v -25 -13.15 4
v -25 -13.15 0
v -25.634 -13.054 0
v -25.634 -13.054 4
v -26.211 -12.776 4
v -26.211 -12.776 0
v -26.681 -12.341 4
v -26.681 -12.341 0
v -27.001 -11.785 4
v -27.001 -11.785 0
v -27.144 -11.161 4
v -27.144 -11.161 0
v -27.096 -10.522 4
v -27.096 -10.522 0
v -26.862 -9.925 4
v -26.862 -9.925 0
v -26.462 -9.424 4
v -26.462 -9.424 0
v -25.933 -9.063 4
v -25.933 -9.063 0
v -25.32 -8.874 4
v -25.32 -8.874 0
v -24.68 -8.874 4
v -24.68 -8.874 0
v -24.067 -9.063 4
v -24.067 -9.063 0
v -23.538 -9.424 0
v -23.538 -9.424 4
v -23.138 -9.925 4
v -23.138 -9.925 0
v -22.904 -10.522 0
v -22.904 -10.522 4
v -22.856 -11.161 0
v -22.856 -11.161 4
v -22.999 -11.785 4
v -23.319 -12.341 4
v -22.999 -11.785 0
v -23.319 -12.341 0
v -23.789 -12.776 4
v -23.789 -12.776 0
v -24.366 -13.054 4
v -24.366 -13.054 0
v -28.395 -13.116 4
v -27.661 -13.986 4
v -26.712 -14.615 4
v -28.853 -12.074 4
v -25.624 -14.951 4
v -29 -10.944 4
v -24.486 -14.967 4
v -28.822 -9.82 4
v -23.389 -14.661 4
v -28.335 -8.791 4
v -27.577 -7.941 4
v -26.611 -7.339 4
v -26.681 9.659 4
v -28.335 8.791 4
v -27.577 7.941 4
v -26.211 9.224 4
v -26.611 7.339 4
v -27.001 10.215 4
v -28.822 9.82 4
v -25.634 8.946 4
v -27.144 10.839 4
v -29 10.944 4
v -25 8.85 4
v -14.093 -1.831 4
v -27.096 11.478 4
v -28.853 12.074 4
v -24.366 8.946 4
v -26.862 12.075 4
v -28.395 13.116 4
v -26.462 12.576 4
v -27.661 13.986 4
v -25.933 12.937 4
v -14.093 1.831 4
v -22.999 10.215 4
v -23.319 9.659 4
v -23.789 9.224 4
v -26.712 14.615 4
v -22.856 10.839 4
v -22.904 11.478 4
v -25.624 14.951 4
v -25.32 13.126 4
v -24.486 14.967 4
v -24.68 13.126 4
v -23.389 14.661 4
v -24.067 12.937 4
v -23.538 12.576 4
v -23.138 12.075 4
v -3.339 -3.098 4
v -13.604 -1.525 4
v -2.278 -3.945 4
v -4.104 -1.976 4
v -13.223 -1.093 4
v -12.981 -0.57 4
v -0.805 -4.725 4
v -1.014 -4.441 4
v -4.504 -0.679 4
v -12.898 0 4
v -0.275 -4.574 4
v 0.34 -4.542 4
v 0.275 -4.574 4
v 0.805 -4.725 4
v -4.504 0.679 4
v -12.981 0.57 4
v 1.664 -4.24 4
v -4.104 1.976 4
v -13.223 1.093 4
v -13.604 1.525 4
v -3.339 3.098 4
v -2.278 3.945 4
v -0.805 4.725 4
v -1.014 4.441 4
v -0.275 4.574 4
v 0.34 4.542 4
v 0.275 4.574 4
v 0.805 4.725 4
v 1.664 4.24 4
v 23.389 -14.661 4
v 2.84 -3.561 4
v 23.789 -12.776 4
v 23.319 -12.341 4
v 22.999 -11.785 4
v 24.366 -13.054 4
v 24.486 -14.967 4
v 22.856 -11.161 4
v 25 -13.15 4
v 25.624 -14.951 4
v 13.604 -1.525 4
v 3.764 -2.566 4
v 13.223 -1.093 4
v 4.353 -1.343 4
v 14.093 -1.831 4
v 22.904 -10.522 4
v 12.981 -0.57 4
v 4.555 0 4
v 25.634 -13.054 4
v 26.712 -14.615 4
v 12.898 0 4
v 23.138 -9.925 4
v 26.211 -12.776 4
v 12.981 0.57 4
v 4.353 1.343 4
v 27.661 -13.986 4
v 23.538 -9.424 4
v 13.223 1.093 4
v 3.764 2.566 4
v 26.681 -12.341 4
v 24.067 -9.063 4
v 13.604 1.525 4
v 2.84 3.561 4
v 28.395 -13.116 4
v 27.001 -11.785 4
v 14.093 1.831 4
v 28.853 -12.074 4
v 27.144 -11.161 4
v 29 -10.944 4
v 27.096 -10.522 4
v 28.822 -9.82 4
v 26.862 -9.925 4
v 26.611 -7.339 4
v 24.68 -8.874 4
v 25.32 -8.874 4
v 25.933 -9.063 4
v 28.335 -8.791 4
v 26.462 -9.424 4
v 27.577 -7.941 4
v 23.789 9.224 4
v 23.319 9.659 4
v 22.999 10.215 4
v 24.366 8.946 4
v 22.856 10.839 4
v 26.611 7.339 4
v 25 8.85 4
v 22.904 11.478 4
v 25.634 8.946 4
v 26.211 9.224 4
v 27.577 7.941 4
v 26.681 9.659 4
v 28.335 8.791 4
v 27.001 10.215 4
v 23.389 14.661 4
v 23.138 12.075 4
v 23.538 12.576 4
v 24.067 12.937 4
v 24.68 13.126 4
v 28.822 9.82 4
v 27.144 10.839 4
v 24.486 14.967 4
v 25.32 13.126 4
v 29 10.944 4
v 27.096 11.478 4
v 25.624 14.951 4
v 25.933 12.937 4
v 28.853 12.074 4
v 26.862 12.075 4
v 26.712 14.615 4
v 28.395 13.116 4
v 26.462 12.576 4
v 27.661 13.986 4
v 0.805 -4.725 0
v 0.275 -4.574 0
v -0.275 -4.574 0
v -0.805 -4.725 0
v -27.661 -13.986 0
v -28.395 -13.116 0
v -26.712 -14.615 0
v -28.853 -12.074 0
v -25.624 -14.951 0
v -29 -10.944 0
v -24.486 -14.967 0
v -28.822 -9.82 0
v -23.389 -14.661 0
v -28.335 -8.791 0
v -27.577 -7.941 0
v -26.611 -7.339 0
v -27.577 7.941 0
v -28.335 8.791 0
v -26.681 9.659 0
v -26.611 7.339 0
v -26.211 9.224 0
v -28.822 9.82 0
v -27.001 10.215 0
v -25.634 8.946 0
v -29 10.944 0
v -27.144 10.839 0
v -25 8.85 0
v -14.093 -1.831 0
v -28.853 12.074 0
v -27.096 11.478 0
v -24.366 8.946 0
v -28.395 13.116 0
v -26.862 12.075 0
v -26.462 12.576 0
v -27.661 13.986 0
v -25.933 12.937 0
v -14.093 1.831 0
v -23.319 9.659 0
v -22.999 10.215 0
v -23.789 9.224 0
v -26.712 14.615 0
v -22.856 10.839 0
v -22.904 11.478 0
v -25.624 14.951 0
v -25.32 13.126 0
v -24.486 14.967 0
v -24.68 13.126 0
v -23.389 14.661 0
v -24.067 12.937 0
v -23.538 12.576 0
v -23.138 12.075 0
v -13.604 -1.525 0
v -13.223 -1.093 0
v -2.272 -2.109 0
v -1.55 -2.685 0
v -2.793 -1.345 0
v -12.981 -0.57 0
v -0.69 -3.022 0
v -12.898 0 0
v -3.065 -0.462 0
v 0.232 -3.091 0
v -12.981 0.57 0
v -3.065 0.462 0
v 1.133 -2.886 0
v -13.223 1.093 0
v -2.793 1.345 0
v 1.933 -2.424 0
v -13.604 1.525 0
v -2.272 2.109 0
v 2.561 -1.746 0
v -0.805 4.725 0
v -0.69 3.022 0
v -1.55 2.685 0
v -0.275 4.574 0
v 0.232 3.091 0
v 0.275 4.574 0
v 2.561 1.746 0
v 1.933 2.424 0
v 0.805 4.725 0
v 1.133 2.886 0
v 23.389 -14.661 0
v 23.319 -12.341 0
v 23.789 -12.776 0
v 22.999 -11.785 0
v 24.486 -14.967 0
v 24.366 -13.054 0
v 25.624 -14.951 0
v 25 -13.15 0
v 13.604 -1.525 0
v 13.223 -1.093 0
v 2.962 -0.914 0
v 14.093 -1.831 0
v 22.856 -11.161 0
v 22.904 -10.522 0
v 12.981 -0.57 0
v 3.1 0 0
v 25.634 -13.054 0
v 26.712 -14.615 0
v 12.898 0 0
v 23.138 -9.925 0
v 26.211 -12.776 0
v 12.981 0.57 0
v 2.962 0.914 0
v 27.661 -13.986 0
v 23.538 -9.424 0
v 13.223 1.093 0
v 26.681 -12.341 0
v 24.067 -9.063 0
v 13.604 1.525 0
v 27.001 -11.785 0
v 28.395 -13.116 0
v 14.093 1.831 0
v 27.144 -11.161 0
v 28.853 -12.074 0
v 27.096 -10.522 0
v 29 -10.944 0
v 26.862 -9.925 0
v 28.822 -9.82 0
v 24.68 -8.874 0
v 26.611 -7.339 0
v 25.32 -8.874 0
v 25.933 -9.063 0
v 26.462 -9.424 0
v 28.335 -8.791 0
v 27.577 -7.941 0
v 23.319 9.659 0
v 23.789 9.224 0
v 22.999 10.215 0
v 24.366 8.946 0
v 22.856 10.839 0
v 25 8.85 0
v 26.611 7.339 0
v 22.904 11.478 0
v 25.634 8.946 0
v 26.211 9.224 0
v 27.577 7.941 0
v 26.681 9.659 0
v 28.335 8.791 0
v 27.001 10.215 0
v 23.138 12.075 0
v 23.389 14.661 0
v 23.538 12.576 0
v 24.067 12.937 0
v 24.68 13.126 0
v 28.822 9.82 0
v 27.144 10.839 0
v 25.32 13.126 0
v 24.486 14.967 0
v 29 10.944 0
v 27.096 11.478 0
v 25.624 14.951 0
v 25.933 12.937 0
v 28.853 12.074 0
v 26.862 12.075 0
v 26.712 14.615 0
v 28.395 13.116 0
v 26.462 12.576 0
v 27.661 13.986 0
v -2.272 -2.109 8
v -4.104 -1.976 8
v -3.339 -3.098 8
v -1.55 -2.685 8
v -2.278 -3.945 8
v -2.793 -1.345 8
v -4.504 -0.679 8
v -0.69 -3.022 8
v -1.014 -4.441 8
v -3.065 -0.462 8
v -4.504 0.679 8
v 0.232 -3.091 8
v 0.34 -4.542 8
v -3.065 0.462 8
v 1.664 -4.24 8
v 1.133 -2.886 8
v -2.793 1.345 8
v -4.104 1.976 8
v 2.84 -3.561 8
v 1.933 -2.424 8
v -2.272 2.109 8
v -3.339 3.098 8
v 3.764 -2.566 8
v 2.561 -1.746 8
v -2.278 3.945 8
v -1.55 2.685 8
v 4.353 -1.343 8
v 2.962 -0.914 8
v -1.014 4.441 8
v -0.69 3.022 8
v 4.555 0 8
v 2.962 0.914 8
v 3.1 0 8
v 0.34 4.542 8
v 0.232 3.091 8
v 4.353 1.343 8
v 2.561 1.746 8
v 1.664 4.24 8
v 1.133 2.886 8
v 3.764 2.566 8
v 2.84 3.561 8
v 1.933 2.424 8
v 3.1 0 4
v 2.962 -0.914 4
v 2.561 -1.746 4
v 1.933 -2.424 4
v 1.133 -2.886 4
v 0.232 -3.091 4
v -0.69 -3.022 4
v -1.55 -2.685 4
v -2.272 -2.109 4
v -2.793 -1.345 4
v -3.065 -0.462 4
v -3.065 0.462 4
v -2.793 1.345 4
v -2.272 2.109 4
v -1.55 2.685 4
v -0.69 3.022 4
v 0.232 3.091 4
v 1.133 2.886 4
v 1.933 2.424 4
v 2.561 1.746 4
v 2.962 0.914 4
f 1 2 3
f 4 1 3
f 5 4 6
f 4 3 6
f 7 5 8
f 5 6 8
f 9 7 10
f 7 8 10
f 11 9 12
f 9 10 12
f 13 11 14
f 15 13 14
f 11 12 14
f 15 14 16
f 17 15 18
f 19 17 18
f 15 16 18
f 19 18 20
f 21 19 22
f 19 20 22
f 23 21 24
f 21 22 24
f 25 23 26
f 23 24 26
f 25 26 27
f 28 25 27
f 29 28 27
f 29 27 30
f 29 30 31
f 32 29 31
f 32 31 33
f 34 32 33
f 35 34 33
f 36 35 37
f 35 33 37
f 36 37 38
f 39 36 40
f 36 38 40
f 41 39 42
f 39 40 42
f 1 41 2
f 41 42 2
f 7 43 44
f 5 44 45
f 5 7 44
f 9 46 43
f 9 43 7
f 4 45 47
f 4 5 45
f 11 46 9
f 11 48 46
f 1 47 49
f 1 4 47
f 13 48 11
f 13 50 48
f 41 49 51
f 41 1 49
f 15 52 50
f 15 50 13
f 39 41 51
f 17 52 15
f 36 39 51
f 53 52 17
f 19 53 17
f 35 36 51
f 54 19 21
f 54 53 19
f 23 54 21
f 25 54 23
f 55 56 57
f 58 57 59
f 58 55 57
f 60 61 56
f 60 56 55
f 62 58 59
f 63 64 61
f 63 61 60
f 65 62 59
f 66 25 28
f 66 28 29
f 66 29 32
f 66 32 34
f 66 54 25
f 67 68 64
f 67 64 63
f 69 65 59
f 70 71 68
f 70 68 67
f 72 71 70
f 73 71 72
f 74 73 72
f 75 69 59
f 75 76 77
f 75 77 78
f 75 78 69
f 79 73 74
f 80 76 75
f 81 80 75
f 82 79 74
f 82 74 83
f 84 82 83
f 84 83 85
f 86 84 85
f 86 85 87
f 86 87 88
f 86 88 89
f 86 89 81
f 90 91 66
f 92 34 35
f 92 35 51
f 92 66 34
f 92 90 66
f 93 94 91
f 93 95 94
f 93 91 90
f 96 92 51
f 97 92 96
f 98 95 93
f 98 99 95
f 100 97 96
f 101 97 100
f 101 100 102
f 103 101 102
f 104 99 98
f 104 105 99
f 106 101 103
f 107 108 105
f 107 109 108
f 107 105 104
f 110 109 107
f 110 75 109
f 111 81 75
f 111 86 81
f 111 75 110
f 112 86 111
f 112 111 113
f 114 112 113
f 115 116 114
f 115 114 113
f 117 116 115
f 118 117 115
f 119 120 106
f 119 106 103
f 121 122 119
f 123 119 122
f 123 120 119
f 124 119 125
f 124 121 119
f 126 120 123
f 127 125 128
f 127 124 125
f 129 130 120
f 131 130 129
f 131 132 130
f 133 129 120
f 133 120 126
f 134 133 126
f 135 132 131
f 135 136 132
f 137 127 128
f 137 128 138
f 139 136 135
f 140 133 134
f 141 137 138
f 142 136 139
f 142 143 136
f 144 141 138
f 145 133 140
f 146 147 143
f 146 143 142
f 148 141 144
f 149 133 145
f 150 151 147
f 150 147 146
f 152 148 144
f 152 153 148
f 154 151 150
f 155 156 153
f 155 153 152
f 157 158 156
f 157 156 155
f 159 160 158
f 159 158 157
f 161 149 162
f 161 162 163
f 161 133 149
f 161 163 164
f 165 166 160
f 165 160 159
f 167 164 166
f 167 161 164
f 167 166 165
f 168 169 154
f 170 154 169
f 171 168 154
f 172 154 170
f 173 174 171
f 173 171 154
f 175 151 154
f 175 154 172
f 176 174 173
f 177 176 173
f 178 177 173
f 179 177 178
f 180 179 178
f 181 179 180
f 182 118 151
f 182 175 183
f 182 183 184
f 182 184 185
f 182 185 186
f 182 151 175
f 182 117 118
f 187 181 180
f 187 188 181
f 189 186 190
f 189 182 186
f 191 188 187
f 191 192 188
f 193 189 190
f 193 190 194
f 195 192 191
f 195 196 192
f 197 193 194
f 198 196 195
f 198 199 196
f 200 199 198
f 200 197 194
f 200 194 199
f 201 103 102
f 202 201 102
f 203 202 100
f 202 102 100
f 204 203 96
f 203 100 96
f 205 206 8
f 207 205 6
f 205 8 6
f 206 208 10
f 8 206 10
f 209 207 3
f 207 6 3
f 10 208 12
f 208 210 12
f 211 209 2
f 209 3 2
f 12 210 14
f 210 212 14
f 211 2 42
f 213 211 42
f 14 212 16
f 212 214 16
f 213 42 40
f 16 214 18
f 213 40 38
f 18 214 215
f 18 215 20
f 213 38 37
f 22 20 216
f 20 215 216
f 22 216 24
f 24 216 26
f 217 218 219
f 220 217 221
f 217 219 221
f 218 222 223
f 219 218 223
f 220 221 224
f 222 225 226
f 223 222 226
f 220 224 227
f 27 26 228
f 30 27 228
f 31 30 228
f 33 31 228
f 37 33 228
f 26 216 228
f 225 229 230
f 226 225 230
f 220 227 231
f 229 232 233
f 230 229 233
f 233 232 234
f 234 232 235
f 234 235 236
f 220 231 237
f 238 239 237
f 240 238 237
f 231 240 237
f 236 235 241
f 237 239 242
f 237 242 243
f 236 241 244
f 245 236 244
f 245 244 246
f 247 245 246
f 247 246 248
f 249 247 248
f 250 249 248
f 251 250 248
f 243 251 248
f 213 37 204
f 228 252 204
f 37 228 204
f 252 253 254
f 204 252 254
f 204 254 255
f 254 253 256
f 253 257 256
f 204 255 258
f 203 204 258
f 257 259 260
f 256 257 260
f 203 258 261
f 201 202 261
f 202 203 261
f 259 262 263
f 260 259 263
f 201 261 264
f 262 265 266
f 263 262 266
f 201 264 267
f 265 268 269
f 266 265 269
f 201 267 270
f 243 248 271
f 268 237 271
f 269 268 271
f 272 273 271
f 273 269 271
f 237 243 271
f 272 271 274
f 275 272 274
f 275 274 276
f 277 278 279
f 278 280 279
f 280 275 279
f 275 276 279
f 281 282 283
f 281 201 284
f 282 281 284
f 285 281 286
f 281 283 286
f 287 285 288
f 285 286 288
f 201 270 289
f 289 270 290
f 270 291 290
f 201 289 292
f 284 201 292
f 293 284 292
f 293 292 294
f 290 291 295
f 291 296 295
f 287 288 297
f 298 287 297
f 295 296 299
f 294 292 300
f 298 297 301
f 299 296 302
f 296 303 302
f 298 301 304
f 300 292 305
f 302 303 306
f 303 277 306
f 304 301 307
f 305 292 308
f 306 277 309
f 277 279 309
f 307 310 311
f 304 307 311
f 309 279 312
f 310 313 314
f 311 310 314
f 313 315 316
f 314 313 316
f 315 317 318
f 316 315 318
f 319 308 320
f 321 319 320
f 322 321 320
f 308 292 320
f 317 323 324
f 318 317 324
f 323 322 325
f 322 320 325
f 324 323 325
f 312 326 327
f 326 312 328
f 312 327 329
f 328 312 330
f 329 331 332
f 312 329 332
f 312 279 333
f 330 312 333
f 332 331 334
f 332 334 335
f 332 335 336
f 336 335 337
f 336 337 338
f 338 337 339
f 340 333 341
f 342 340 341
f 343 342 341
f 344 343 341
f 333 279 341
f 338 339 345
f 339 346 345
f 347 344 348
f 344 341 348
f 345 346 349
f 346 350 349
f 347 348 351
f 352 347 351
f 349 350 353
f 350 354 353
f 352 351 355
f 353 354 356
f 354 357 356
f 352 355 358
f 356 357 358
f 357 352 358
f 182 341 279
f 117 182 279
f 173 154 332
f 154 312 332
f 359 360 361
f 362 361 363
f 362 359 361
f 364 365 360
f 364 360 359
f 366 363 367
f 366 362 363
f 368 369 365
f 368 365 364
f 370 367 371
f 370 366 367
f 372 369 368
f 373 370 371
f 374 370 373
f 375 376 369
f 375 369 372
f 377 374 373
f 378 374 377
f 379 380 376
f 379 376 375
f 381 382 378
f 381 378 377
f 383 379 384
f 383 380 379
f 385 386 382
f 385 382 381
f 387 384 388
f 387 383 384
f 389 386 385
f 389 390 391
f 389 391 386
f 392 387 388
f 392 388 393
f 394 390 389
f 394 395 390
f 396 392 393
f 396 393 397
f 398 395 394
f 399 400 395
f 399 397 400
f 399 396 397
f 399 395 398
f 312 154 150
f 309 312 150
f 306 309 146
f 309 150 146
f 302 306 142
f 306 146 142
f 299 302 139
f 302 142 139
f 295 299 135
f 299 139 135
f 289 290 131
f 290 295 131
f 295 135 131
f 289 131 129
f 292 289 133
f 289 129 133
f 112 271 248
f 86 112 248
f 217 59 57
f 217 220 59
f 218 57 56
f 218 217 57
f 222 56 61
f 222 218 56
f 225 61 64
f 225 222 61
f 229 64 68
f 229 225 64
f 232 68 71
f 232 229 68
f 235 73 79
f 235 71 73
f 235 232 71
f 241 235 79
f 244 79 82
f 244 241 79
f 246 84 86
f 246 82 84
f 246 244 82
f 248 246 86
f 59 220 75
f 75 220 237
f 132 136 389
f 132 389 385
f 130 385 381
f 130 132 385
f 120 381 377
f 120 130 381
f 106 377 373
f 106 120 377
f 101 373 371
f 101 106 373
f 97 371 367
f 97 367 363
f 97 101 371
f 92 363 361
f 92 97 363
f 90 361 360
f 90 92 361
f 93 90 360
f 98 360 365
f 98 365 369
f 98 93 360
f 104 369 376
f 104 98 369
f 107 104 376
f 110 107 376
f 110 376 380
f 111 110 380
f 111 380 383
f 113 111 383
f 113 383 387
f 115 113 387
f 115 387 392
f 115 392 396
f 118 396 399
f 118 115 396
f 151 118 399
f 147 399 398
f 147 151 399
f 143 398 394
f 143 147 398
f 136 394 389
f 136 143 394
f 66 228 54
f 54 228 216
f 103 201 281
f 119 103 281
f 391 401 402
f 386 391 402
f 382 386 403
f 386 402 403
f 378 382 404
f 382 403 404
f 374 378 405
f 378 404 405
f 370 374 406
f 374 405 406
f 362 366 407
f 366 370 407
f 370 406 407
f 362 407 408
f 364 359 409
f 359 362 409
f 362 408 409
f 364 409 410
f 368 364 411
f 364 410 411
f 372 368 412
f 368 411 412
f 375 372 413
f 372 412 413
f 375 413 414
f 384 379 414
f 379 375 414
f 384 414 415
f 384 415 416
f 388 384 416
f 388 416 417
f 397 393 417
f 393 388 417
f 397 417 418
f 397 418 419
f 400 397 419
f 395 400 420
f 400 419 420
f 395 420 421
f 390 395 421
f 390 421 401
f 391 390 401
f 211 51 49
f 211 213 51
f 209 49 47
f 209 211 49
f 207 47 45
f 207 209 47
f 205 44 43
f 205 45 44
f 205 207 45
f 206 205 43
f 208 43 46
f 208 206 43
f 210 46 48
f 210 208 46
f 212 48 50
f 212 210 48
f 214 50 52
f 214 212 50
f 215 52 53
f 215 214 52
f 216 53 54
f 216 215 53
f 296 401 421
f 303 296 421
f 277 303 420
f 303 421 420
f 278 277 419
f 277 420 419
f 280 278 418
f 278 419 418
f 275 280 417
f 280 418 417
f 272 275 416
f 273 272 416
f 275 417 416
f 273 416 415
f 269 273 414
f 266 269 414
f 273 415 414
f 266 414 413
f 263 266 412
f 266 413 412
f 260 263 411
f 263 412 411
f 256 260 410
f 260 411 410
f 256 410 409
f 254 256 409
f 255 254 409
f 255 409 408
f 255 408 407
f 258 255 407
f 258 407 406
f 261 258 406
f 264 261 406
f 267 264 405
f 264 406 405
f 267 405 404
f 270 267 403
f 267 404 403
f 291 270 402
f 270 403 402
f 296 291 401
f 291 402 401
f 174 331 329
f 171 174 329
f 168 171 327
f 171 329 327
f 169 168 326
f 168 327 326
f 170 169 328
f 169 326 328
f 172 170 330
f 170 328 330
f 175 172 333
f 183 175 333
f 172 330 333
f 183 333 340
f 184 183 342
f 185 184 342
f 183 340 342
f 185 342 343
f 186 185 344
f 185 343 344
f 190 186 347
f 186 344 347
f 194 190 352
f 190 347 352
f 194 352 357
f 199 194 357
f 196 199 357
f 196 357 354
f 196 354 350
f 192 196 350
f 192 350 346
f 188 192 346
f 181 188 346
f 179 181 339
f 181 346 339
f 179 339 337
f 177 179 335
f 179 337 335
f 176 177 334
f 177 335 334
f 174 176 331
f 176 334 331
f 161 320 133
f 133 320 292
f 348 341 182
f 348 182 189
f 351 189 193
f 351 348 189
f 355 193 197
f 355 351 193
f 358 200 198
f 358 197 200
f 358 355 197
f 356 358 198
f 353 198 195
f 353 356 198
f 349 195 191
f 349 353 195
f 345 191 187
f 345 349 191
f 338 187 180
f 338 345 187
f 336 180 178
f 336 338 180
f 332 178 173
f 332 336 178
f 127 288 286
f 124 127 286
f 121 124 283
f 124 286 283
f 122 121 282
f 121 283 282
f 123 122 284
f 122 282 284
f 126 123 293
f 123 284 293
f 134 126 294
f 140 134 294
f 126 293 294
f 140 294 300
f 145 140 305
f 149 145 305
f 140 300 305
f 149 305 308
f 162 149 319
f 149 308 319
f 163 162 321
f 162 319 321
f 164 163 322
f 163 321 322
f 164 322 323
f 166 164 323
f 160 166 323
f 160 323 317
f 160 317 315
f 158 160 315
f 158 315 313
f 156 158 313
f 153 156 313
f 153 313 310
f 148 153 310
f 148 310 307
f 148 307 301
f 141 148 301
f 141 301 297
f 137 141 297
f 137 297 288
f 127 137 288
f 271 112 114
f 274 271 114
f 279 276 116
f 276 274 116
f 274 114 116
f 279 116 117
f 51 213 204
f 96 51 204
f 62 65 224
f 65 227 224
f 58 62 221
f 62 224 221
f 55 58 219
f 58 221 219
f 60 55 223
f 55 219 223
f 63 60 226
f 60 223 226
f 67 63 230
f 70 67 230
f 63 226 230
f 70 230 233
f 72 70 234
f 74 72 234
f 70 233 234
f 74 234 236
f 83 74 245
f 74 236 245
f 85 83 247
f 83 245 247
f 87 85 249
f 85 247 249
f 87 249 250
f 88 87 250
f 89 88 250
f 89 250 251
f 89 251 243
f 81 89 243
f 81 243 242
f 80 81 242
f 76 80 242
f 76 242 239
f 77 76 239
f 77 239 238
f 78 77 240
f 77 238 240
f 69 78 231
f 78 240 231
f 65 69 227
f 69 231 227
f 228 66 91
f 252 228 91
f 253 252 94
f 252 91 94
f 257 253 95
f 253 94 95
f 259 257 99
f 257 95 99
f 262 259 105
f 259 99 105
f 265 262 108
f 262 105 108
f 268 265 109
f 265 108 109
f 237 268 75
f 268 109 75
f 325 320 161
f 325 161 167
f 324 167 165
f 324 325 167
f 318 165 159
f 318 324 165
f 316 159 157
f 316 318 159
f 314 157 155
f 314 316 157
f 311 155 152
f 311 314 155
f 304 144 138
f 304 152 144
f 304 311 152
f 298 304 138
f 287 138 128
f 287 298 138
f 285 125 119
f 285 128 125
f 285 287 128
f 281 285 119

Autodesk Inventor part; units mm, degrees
ref_plane "YZ Plane" through (0, 0, 0) normal (1, 0, 0) x (0, 1, 0)
ref_plane "XZ Plane" through (0, 0, 0) normal (0, 1, 0) x (-1, 0, 0)
ref_plane "XY Plane" through (0, 0, 0) normal (0, 0, 1) x (1, 0, 0)
sketch "スケッチ1" plane through (0, 0, 0) normal (0, 0, 1) x (1, 0, 0)
  line L0 (-25, -11) -> (25, -11) construction
  line L1 (25, -11) -> (25, 11) construction
  line L2 (25, 11) -> (-25, 11) construction
  line L3 (-25, 11) -> (-25, -11) construction
  line L4 (-25, -11) -> (25, 11) construction
  line L5 (25, -11) -> (-25, 11) construction
  line L6 (25, -11) -> (-25, 11) construction
  line L7 (26.611, -7.3387) -> (-23.389, 14.6613)
  line L8 (-26.611, 7.3387) -> (23.389, -14.6613)
  arc A0 (23.389, -14.6613) -> (26.611, -7.3387) centre (25, -11) ccw
  arc A1 (-23.389, 14.6613) -> (-26.611, 7.3387) centre (-25, 11) ccw
  line L9 (-25, -11) -> (25, 11) construction
  line L10 (-23.389, -14.6613) -> (26.611, 7.3387)
  line L11 (23.389, 14.6613) -> (-26.611, -7.3387)
  arc A2 (-26.611, -7.3387) -> (-23.389, -14.6613) centre (-25, -11) ccw
  arc A3 (26.611, 7.3387) -> (23.389, 14.6613) centre (25, 11) ccw
  point P0 (0, 0)
  point P1 (0, 4.3701)
  point P2 (-9.932, 0)
  point P3 (0, -4.3701)
  point P4 (9.932, 0)
  dimension "d0" = 50
  dimension "d1" = 22
  dimension "d2" = 8
  dimension "d3" = 8
extrude "押し出し1" add sketch "スケッチ1" along normal blind 4
fillet "フィレット1" radius 2 4 edges at (0, -4.3701, 2) (-9.932, 0, 2) (0, 4.3701, 2) (9.932, 0, 2)
sketch "スケッチ2" plane through (0, 0, 4) normal (0, 0, 1) x (1, 0, 0)
  arc A0 (-23.389, 14.6613) -> (-26.611, 7.3387) centre (-25, 11) ccw projected
  arc A1 (-26.611, -7.3387) -> (-23.389, -14.6613) centre (-25, -11) ccw projected
  arc A2 (23.389, -14.6613) -> (26.611, -7.3387) centre (25, -11) ccw projected
  arc A3 (26.611, 7.3387) -> (23.389, 14.6613) centre (25, 11) ccw projected
  point P0 (0, 0)
  point P1 (-28.3993, 7.3333)
  point P2 (-28.3993, -7.3333)
  point P3 (28.3993, -7.3333)
  point P4 (28.3993, 7.3333)
hole "穴1" at (-25, 11, 4) at (25, 11, 4) at (25, -11, 4) at (-25, -11, 4) direction (0, 0, -1) diameter 4.3 end through all clearance for "Flat Head Machine Screw" size "M4" standard "Ansi Metric M Profile"
sketch "スケッチ3" plane through (0, 0, 4) normal (0, 0, 1) x (1, 0, 0)
  circle A0 centre (0, 0) radius 3.1
  dimension "d15" = 6.2
extrude "押し出し2" cut sketch "スケッチ3" against normal blind 8
sketch "スケッチ4" plane through (0, 0, 4) normal (0, 0, 1) x (1, 0, 0)
  circle A0 centre (0, 0) radius 3.1 projected
  circle A1 centre (0, 0) radius 4.5551
  arc A2 (-0.8055, 4.7245) -> (0.8055, 4.7245) centre (0, 6.5551) ccw projected
extrude "押し出し3" add sketch "スケッチ4" along normal blind 4
properties part number "base21" material "ABS プラスチック"
